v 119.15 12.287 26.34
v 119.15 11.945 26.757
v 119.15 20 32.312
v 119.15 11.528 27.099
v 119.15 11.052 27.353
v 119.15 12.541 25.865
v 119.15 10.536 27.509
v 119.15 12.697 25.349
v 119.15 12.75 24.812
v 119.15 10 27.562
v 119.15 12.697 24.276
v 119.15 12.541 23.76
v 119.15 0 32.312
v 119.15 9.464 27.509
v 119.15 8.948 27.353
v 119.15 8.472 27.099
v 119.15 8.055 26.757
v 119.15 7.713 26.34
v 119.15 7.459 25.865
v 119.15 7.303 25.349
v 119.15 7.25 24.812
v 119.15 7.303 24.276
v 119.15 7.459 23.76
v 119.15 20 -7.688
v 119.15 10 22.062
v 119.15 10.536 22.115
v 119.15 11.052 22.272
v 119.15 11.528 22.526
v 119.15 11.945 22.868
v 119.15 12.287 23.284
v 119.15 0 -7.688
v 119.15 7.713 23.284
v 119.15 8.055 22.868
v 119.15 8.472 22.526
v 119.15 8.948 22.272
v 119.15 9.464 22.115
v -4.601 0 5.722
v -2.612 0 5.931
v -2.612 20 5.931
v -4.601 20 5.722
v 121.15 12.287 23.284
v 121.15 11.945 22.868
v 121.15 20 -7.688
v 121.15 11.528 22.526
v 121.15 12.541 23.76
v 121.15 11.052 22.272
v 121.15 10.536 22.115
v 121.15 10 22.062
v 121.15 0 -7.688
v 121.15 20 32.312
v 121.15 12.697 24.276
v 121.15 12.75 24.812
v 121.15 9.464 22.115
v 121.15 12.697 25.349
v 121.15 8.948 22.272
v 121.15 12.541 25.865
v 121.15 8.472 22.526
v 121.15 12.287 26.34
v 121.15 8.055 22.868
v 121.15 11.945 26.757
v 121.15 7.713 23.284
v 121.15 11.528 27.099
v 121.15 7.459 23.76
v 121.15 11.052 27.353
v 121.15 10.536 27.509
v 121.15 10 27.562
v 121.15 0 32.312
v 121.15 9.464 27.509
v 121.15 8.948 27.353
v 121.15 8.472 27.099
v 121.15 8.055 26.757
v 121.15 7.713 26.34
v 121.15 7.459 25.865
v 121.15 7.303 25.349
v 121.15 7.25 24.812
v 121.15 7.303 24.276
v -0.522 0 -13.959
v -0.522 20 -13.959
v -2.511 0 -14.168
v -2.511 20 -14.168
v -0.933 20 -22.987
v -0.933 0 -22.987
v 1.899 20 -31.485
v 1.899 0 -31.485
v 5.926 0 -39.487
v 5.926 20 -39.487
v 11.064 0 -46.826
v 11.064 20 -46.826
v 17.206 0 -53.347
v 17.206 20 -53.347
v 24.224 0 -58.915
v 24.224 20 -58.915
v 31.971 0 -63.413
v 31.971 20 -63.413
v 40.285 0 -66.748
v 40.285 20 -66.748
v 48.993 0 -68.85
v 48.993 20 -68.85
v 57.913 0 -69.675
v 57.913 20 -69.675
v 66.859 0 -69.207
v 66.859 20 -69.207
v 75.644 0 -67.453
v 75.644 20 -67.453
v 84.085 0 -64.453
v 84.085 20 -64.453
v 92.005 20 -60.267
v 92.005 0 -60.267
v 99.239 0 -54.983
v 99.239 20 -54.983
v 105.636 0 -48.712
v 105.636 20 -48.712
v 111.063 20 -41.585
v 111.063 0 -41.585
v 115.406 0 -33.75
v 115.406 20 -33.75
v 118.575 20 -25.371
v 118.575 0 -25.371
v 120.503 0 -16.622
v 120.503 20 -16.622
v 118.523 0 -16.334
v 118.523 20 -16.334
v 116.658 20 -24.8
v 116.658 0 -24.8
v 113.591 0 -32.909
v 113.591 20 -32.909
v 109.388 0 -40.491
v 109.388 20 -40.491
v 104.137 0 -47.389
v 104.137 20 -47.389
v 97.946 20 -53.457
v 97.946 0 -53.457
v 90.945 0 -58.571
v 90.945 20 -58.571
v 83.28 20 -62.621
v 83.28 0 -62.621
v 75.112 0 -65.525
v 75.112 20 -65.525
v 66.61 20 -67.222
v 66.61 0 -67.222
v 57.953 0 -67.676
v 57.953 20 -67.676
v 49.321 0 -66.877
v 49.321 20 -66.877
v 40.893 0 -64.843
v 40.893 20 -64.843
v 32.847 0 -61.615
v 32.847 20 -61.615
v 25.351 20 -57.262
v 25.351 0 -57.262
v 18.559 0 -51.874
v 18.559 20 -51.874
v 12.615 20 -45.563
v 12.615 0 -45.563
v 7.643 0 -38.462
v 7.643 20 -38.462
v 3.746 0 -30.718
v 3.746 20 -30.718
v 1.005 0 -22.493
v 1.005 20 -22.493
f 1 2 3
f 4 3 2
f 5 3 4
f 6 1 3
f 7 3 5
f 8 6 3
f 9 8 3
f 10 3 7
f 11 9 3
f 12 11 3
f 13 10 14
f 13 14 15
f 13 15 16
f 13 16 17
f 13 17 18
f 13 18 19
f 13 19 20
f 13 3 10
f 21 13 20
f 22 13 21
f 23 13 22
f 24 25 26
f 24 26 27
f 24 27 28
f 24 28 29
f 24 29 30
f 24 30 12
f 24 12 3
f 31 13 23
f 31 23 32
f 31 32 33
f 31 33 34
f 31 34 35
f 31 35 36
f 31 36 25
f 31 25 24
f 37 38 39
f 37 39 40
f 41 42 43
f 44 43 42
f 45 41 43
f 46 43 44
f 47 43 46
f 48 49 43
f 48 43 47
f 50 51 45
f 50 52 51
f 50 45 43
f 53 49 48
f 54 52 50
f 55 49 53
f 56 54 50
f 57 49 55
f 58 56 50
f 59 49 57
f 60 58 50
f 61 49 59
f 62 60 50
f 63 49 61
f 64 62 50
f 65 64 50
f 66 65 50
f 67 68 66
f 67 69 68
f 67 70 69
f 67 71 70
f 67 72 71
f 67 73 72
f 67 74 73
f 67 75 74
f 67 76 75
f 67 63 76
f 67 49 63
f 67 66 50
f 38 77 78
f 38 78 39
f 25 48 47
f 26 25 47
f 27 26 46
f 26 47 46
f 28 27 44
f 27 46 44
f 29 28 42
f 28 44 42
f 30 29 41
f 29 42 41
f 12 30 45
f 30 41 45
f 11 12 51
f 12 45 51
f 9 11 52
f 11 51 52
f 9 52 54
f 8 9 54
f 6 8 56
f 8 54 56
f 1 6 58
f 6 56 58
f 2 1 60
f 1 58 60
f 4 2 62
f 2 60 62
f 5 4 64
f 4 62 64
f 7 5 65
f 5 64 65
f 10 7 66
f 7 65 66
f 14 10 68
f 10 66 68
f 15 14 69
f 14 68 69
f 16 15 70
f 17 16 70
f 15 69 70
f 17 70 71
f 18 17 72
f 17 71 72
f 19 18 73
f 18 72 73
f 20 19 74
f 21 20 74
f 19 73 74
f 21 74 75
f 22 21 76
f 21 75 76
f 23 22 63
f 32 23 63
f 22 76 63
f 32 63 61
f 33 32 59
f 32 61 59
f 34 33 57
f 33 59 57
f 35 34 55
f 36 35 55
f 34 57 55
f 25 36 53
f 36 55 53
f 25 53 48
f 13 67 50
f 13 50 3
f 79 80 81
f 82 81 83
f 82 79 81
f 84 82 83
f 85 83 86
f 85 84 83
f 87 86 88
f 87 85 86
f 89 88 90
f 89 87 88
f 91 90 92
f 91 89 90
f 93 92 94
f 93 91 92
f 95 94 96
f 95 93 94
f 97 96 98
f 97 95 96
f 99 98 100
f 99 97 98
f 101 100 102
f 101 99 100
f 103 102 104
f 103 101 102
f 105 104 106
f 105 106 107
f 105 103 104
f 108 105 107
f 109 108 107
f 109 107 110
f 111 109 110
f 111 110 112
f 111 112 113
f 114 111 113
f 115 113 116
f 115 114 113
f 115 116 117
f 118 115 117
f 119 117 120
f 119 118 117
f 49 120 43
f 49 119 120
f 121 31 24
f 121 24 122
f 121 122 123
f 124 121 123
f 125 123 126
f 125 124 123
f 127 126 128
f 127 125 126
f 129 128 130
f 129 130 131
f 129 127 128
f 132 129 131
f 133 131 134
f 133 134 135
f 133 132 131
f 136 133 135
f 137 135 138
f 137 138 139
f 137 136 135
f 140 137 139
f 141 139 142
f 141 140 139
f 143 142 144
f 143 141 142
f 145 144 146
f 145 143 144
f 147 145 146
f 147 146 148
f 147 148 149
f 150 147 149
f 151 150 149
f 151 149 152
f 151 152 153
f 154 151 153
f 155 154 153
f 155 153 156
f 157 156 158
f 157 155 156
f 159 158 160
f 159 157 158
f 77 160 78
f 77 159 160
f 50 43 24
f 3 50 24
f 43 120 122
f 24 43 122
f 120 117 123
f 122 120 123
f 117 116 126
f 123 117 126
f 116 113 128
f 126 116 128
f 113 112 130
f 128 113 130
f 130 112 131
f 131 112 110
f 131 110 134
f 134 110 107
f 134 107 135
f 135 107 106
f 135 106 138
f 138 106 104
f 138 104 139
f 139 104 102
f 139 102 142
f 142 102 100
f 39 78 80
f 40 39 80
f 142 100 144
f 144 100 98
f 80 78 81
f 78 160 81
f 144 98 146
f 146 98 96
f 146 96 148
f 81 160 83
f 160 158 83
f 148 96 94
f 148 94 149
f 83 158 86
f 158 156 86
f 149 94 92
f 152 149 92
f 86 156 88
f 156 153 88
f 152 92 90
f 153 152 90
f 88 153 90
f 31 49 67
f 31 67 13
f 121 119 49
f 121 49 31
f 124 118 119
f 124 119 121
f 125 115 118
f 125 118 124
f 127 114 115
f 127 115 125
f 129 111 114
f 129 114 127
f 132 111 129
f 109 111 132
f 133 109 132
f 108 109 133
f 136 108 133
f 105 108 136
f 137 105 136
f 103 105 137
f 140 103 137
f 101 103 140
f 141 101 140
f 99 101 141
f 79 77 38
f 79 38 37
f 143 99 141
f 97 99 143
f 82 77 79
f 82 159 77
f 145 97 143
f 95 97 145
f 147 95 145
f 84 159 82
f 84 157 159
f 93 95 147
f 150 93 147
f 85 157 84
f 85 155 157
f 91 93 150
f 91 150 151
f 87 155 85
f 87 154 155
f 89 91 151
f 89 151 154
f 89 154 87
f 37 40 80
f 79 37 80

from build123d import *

# Parameters (mm, degrees)
RESSALTO_EXTRUS_O1_DEPTH = 20
ESBO_O2_R                = 2.75
CORTE_EXTRUS_O1_DEPTH    = 2


with BuildPart() as part:
    # Esboço1 → Ressalto-extrusão1 (new body)
    with BuildSketch(Plane(origin=(0, 0, 0), x_dir=(1, 0, 0), z_dir=(0, 1, 0))):
        with BuildLine():
            Line((-0.521579636, 13.959411341), (-2.612148901, -5.931026567))
            Line((-2.612148901, -5.931026567), (-4.601192692, -5.72196964))
            Line((-4.601192692, -5.72196964), (-2.510623427, 14.168468267))
            ThreePointArc((-2.510623427, 14.168468267), (62.394563373, 69.6027347), (121.149734086, 7.687703545))
            Line((121.149734086, 7.687703545), (121.149734086, -32.312296455))
            Line((121.149734086, -32.312296455), (119.149734086, -32.312296455))
            Line((119.149734086, -32.312296455), (119.149734086, 7.687703545))
            ThreePointArc((119.149734086, 7.687703545), (62.289891461, 67.60547563), (-0.521579636, 13.959411341))
        make_face()
    extrude(amount=RESSALTO_EXTRUS_O1_DEPTH)

    # Esboço2 → Corte-extrusão1 (cut)
    with BuildSketch(Plane(origin=(121.149734086, 0, 0), x_dir=(0, 0, -1), z_dir=(1, 0, 0))):
        with Locations((-24.812296455, 10)):
            Circle(ESBO_O2_R)
    extrude(amount=-CORTE_EXTRUS_O1_DEPTH, mode=Mode.SUBTRACT)


solid = part.part
